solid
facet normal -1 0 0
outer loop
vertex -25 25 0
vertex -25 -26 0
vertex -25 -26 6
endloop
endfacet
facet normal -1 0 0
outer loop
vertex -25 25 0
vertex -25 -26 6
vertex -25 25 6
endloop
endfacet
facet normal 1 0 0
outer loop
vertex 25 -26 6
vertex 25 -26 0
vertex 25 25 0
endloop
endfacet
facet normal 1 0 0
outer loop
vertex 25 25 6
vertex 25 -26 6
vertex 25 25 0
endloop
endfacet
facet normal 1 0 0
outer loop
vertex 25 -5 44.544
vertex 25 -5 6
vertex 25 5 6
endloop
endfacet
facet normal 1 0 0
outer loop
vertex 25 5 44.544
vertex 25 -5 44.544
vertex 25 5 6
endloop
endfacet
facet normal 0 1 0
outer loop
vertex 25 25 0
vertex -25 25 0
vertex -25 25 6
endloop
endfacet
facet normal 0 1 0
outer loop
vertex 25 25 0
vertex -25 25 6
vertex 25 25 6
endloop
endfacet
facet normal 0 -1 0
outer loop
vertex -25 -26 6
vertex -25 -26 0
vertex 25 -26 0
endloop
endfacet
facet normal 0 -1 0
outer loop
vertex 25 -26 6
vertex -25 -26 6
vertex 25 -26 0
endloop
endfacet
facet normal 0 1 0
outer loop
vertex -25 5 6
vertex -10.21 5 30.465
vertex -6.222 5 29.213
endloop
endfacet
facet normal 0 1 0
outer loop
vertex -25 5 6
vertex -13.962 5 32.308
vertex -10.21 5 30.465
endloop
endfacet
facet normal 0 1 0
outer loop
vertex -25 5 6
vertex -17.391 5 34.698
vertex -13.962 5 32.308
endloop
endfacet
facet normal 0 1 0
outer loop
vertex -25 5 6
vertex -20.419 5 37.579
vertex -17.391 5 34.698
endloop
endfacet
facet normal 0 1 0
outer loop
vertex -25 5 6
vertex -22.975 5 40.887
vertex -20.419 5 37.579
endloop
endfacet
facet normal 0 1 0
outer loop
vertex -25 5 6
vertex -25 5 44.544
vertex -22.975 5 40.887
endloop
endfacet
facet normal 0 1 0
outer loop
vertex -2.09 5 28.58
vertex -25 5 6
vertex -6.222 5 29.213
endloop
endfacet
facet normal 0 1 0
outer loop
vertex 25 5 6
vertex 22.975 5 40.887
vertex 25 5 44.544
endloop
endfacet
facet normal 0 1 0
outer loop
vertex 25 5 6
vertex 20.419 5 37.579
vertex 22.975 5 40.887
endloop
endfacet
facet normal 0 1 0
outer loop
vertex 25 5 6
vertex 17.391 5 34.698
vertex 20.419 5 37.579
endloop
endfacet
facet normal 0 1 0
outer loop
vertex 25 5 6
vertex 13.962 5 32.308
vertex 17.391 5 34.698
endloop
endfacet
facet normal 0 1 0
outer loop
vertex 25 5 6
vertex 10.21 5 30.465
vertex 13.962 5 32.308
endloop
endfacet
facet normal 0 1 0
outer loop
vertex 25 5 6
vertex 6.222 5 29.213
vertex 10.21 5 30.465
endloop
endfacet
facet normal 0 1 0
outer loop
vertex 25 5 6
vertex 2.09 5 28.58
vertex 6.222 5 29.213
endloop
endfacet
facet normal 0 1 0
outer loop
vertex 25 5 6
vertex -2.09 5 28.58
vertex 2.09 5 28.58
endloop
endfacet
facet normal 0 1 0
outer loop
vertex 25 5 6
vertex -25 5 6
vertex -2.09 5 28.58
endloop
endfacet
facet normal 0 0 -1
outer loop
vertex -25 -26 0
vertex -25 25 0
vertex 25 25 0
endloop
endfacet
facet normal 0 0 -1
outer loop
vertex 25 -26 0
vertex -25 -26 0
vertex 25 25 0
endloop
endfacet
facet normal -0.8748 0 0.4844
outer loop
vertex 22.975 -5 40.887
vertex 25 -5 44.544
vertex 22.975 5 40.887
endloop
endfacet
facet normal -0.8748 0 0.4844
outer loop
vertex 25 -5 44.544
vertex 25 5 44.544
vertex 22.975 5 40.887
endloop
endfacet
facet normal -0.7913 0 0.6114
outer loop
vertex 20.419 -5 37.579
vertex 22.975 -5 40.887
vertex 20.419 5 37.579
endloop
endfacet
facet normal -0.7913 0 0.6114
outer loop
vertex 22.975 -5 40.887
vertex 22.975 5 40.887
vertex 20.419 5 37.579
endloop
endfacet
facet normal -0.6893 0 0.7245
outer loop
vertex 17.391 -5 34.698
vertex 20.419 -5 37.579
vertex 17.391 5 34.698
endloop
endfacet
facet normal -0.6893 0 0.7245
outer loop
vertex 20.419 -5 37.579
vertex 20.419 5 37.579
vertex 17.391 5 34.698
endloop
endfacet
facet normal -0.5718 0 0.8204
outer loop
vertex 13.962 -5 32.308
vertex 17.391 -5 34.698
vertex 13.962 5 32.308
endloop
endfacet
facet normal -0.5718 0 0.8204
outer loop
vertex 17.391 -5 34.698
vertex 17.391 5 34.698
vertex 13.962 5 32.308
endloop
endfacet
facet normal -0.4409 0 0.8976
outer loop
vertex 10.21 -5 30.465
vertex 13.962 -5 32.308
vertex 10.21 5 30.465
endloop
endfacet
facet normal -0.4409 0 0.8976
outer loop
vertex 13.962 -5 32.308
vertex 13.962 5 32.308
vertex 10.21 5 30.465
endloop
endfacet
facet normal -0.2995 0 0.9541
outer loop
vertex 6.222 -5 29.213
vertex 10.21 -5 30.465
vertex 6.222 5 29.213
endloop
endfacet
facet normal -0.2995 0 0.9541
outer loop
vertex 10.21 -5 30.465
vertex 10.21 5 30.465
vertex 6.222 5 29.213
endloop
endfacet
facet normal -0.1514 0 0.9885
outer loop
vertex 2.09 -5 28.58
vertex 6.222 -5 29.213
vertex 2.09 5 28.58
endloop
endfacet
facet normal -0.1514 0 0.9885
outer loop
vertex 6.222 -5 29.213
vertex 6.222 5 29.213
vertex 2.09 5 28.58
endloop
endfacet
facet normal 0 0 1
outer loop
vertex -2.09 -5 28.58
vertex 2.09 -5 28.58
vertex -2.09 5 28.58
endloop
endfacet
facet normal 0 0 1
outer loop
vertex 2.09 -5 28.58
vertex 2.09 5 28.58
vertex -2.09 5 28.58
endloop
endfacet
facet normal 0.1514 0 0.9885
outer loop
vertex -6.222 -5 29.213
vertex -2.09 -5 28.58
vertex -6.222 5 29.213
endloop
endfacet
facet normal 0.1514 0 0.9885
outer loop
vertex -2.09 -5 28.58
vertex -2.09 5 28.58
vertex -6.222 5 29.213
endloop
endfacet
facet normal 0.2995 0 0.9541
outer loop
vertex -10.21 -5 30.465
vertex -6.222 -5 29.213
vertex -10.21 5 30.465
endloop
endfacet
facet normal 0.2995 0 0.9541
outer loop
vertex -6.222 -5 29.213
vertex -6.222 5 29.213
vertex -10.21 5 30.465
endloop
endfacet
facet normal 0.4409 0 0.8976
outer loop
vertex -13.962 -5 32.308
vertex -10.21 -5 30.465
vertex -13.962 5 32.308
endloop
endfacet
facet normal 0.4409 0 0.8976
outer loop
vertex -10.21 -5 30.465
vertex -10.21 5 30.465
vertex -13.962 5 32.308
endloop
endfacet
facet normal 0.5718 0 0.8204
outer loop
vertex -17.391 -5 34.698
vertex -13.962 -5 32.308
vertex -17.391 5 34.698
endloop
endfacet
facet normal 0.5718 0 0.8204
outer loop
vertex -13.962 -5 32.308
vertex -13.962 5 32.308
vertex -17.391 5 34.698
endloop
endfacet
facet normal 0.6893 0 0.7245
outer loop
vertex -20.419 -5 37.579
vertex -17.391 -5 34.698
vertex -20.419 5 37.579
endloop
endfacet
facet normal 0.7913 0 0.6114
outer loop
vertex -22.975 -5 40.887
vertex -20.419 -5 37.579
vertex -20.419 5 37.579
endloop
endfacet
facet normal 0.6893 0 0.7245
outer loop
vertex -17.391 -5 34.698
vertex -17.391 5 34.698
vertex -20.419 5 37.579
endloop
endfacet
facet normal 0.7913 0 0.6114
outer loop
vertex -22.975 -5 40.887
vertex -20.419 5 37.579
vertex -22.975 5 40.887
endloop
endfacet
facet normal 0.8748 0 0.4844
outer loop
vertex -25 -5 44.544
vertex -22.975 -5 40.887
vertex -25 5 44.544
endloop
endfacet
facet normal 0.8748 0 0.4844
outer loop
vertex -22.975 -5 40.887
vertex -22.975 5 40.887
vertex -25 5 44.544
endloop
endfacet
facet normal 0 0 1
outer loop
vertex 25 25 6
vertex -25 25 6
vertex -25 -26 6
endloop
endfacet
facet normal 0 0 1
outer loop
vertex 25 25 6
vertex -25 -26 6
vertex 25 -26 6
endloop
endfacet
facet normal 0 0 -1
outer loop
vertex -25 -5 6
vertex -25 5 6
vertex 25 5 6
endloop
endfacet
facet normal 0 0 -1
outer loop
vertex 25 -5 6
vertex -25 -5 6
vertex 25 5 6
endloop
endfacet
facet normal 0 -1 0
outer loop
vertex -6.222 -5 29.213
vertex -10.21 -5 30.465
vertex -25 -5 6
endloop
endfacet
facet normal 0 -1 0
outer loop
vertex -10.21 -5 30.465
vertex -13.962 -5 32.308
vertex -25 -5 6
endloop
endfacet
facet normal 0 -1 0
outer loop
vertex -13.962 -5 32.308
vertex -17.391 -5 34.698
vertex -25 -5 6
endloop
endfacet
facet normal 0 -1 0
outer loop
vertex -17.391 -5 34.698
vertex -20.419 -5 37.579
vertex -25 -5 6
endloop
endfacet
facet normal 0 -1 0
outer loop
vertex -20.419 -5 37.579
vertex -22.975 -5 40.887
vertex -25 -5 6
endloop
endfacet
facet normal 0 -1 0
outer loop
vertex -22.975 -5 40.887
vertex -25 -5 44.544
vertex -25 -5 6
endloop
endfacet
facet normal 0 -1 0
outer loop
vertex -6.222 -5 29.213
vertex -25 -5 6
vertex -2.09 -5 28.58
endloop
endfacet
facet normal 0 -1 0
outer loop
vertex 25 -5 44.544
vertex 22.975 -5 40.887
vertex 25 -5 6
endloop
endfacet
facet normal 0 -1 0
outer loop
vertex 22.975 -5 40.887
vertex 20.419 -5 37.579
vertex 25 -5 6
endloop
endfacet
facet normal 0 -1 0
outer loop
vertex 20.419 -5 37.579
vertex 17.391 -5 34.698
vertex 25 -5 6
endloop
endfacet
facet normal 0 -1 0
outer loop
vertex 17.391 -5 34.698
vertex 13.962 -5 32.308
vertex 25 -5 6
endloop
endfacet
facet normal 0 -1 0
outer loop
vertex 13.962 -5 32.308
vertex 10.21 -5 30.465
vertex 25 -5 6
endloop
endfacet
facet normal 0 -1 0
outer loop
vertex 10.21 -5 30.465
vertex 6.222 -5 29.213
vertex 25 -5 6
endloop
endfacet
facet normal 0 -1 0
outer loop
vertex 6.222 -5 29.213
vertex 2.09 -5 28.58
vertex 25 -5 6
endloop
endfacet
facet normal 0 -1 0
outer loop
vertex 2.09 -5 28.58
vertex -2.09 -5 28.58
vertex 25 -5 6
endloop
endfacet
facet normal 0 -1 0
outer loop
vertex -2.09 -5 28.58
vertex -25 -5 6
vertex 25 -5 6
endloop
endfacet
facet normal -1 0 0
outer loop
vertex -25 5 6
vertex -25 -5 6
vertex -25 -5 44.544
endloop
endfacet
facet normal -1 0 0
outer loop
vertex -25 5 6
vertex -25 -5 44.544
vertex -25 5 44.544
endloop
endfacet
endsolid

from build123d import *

# Parameters (mm, degrees)
F0_W     = 50
F0_H     = 51
F1_DEPTH = 6
F2_W     = 50
F2_H     = 10
F3_DEPTH = 50
F5_D     = 55


with BuildPart() as f1:
    # F0 (on Top) → F1 (new body)
    with BuildSketch(Plane.XY):
        with Locations((0, -0.5)):
            Rectangle(F0_W, F0_H)
    extrude(amount=F1_DEPTH)


with BuildPart() as f3:
    # F2 (on face) → F3 (new body)
    with BuildSketch(Plane.XY.offset(6)):
        Rectangle(F2_W, F2_H)
    extrude(amount=F3_DEPTH)

    # F5 (through all)
    with Locations(Plane.XZ.offset(5)):
        with Locations((0, 56)):
            Hole(F5_D / 2)


solid = Compound([f1.part, f3.part])
